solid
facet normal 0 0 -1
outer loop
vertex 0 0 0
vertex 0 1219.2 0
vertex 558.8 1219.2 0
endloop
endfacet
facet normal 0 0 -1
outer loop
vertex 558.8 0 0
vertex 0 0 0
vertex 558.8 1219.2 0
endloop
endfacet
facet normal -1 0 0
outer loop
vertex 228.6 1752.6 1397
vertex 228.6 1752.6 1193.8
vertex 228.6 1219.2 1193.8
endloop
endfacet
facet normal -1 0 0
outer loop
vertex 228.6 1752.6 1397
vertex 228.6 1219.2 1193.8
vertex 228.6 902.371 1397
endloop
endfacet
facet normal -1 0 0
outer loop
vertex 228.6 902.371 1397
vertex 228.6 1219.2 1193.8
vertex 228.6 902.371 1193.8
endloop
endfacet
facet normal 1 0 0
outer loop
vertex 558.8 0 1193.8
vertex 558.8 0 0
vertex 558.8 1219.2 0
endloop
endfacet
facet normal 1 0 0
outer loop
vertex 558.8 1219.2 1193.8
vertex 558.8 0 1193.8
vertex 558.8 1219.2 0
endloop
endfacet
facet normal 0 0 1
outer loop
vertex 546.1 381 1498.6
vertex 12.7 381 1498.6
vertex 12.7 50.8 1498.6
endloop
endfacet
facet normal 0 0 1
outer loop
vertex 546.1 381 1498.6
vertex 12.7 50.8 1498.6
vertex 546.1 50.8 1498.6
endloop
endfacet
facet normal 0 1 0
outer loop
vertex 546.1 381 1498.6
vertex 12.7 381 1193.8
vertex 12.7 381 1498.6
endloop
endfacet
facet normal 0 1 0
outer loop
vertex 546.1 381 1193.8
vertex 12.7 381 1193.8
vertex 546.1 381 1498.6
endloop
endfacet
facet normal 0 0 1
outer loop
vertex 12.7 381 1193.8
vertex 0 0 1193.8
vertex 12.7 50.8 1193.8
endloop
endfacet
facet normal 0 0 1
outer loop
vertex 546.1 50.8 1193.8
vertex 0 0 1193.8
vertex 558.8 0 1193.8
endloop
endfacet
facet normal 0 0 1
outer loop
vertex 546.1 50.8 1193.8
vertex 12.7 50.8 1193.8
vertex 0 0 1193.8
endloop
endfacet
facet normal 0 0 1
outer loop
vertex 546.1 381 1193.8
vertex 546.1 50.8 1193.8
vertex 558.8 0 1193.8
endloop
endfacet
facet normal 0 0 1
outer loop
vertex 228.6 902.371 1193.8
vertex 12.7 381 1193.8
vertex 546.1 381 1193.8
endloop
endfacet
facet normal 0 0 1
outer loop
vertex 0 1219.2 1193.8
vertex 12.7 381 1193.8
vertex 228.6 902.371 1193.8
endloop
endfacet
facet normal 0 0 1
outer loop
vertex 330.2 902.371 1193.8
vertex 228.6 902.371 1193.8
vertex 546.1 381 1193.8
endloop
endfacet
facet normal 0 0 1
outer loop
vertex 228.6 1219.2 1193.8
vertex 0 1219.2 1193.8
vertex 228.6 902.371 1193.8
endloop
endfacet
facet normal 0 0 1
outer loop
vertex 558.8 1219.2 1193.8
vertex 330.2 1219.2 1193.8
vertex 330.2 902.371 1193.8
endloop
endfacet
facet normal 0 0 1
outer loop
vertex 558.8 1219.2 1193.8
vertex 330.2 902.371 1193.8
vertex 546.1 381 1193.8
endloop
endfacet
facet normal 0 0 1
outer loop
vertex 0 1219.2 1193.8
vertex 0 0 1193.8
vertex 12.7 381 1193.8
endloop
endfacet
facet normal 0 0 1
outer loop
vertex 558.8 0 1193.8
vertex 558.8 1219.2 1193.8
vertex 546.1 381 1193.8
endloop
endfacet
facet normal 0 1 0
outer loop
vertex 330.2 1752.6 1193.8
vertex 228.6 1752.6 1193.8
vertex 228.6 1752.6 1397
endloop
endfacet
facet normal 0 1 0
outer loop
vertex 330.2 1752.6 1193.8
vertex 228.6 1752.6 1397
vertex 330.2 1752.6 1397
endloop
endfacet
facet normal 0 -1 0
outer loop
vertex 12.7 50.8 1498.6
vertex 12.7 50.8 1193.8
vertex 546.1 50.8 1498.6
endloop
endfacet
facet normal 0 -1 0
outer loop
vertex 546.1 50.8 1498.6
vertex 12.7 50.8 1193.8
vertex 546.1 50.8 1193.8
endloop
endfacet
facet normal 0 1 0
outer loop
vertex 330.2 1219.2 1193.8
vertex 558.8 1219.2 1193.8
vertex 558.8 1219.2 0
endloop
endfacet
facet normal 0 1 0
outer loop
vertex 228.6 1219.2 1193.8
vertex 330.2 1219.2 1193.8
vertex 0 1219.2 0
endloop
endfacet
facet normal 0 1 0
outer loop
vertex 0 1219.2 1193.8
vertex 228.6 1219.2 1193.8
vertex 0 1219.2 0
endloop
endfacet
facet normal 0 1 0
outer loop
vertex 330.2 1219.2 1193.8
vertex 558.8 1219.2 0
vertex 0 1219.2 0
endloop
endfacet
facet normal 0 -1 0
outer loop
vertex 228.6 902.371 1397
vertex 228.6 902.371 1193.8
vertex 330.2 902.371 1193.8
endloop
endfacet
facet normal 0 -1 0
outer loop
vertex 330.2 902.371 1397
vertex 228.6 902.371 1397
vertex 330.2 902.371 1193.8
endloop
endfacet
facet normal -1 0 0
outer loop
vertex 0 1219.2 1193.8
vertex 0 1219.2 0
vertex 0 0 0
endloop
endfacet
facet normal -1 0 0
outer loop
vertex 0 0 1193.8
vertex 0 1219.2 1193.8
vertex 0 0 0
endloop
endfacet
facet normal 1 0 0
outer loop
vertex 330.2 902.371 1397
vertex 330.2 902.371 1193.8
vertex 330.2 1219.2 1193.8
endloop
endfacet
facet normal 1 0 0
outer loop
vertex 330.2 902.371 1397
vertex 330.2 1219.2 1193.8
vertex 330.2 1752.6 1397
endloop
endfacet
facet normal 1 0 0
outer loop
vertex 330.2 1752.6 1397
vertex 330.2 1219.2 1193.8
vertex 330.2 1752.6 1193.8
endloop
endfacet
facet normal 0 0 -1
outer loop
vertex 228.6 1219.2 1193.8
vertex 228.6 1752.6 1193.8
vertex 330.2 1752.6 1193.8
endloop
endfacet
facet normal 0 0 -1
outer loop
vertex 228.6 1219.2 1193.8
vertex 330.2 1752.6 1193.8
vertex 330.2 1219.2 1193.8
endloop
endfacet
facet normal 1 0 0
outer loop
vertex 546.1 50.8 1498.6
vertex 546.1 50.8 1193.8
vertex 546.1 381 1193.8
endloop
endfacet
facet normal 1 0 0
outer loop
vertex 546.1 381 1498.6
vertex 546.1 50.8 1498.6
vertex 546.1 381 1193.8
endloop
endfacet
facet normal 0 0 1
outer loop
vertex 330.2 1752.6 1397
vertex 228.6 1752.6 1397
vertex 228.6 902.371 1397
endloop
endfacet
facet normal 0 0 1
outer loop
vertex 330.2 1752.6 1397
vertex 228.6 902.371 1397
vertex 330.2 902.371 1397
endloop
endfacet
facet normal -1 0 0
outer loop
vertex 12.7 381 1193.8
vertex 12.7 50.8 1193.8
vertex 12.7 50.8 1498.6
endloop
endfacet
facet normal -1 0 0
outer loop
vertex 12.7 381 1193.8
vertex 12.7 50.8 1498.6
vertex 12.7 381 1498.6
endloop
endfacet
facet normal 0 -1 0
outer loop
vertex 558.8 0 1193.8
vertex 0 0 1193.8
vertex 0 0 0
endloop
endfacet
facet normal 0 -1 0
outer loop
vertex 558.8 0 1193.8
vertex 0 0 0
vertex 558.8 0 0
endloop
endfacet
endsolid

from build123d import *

# Parameters (mm, degrees)
F0_W     = 533.4
F0_H     = 330.2
F1_DEPTH = 1193.8
F0_W_2   = 101.6
F0_H_2   = 533.4
F0_H_3   = 316.828786
F2_DEPTH = 1397
F3_DEPTH = 1498.6
F4_W     = 533.4
F4_H     = 1193.8
F5_DEPTH = 330.201


with BuildPart() as f1:
    # F0 (on Top) → F1 (new body)
    with BuildSketch(Plane.XY):
        Polygon((0, 1219.2), (0, 0), (558.8, 0), (558.8, 1219.2), (330.2, 1219.2), (330.2, 902.371214), (228.6, 902.371214), (228.6, 1219.2), align=None)
        with Locations((279.4, 215.9)):
            Rectangle(F0_W, F0_H, mode=Mode.SUBTRACT)
    extrude(amount=F1_DEPTH)

    # F0 (on Top) → F2 (join)
    with BuildSketch(Plane.XY):
        with Locations((279.4, 1485.9)):
            Rectangle(F0_W_2, F0_H_2)
        with Locations((279.4, 1060.785607)):
            Rectangle(F0_W_2, F0_H_3)
    extrude(amount=F2_DEPTH)

    # F0 (on Top) → F3 (join)
    with BuildSketch(Plane.XY):
        with Locations((279.4, 215.9)):
            Rectangle(F0_W, F0_H)
    extrude(amount=F3_DEPTH)

    # F4 (on face) → F5 (cut, through all)
    with BuildSketch(Plane(origin=(228.6, 0, 0), x_dir=(0, -1, 0), z_dir=(-1, 0, 0))):
        with Locations((-1485.9, 596.9)):
            Rectangle(F4_W, F4_H)
    extrude(amount=-F5_DEPTH, mode=Mode.SUBTRACT)


solid = f1.part
